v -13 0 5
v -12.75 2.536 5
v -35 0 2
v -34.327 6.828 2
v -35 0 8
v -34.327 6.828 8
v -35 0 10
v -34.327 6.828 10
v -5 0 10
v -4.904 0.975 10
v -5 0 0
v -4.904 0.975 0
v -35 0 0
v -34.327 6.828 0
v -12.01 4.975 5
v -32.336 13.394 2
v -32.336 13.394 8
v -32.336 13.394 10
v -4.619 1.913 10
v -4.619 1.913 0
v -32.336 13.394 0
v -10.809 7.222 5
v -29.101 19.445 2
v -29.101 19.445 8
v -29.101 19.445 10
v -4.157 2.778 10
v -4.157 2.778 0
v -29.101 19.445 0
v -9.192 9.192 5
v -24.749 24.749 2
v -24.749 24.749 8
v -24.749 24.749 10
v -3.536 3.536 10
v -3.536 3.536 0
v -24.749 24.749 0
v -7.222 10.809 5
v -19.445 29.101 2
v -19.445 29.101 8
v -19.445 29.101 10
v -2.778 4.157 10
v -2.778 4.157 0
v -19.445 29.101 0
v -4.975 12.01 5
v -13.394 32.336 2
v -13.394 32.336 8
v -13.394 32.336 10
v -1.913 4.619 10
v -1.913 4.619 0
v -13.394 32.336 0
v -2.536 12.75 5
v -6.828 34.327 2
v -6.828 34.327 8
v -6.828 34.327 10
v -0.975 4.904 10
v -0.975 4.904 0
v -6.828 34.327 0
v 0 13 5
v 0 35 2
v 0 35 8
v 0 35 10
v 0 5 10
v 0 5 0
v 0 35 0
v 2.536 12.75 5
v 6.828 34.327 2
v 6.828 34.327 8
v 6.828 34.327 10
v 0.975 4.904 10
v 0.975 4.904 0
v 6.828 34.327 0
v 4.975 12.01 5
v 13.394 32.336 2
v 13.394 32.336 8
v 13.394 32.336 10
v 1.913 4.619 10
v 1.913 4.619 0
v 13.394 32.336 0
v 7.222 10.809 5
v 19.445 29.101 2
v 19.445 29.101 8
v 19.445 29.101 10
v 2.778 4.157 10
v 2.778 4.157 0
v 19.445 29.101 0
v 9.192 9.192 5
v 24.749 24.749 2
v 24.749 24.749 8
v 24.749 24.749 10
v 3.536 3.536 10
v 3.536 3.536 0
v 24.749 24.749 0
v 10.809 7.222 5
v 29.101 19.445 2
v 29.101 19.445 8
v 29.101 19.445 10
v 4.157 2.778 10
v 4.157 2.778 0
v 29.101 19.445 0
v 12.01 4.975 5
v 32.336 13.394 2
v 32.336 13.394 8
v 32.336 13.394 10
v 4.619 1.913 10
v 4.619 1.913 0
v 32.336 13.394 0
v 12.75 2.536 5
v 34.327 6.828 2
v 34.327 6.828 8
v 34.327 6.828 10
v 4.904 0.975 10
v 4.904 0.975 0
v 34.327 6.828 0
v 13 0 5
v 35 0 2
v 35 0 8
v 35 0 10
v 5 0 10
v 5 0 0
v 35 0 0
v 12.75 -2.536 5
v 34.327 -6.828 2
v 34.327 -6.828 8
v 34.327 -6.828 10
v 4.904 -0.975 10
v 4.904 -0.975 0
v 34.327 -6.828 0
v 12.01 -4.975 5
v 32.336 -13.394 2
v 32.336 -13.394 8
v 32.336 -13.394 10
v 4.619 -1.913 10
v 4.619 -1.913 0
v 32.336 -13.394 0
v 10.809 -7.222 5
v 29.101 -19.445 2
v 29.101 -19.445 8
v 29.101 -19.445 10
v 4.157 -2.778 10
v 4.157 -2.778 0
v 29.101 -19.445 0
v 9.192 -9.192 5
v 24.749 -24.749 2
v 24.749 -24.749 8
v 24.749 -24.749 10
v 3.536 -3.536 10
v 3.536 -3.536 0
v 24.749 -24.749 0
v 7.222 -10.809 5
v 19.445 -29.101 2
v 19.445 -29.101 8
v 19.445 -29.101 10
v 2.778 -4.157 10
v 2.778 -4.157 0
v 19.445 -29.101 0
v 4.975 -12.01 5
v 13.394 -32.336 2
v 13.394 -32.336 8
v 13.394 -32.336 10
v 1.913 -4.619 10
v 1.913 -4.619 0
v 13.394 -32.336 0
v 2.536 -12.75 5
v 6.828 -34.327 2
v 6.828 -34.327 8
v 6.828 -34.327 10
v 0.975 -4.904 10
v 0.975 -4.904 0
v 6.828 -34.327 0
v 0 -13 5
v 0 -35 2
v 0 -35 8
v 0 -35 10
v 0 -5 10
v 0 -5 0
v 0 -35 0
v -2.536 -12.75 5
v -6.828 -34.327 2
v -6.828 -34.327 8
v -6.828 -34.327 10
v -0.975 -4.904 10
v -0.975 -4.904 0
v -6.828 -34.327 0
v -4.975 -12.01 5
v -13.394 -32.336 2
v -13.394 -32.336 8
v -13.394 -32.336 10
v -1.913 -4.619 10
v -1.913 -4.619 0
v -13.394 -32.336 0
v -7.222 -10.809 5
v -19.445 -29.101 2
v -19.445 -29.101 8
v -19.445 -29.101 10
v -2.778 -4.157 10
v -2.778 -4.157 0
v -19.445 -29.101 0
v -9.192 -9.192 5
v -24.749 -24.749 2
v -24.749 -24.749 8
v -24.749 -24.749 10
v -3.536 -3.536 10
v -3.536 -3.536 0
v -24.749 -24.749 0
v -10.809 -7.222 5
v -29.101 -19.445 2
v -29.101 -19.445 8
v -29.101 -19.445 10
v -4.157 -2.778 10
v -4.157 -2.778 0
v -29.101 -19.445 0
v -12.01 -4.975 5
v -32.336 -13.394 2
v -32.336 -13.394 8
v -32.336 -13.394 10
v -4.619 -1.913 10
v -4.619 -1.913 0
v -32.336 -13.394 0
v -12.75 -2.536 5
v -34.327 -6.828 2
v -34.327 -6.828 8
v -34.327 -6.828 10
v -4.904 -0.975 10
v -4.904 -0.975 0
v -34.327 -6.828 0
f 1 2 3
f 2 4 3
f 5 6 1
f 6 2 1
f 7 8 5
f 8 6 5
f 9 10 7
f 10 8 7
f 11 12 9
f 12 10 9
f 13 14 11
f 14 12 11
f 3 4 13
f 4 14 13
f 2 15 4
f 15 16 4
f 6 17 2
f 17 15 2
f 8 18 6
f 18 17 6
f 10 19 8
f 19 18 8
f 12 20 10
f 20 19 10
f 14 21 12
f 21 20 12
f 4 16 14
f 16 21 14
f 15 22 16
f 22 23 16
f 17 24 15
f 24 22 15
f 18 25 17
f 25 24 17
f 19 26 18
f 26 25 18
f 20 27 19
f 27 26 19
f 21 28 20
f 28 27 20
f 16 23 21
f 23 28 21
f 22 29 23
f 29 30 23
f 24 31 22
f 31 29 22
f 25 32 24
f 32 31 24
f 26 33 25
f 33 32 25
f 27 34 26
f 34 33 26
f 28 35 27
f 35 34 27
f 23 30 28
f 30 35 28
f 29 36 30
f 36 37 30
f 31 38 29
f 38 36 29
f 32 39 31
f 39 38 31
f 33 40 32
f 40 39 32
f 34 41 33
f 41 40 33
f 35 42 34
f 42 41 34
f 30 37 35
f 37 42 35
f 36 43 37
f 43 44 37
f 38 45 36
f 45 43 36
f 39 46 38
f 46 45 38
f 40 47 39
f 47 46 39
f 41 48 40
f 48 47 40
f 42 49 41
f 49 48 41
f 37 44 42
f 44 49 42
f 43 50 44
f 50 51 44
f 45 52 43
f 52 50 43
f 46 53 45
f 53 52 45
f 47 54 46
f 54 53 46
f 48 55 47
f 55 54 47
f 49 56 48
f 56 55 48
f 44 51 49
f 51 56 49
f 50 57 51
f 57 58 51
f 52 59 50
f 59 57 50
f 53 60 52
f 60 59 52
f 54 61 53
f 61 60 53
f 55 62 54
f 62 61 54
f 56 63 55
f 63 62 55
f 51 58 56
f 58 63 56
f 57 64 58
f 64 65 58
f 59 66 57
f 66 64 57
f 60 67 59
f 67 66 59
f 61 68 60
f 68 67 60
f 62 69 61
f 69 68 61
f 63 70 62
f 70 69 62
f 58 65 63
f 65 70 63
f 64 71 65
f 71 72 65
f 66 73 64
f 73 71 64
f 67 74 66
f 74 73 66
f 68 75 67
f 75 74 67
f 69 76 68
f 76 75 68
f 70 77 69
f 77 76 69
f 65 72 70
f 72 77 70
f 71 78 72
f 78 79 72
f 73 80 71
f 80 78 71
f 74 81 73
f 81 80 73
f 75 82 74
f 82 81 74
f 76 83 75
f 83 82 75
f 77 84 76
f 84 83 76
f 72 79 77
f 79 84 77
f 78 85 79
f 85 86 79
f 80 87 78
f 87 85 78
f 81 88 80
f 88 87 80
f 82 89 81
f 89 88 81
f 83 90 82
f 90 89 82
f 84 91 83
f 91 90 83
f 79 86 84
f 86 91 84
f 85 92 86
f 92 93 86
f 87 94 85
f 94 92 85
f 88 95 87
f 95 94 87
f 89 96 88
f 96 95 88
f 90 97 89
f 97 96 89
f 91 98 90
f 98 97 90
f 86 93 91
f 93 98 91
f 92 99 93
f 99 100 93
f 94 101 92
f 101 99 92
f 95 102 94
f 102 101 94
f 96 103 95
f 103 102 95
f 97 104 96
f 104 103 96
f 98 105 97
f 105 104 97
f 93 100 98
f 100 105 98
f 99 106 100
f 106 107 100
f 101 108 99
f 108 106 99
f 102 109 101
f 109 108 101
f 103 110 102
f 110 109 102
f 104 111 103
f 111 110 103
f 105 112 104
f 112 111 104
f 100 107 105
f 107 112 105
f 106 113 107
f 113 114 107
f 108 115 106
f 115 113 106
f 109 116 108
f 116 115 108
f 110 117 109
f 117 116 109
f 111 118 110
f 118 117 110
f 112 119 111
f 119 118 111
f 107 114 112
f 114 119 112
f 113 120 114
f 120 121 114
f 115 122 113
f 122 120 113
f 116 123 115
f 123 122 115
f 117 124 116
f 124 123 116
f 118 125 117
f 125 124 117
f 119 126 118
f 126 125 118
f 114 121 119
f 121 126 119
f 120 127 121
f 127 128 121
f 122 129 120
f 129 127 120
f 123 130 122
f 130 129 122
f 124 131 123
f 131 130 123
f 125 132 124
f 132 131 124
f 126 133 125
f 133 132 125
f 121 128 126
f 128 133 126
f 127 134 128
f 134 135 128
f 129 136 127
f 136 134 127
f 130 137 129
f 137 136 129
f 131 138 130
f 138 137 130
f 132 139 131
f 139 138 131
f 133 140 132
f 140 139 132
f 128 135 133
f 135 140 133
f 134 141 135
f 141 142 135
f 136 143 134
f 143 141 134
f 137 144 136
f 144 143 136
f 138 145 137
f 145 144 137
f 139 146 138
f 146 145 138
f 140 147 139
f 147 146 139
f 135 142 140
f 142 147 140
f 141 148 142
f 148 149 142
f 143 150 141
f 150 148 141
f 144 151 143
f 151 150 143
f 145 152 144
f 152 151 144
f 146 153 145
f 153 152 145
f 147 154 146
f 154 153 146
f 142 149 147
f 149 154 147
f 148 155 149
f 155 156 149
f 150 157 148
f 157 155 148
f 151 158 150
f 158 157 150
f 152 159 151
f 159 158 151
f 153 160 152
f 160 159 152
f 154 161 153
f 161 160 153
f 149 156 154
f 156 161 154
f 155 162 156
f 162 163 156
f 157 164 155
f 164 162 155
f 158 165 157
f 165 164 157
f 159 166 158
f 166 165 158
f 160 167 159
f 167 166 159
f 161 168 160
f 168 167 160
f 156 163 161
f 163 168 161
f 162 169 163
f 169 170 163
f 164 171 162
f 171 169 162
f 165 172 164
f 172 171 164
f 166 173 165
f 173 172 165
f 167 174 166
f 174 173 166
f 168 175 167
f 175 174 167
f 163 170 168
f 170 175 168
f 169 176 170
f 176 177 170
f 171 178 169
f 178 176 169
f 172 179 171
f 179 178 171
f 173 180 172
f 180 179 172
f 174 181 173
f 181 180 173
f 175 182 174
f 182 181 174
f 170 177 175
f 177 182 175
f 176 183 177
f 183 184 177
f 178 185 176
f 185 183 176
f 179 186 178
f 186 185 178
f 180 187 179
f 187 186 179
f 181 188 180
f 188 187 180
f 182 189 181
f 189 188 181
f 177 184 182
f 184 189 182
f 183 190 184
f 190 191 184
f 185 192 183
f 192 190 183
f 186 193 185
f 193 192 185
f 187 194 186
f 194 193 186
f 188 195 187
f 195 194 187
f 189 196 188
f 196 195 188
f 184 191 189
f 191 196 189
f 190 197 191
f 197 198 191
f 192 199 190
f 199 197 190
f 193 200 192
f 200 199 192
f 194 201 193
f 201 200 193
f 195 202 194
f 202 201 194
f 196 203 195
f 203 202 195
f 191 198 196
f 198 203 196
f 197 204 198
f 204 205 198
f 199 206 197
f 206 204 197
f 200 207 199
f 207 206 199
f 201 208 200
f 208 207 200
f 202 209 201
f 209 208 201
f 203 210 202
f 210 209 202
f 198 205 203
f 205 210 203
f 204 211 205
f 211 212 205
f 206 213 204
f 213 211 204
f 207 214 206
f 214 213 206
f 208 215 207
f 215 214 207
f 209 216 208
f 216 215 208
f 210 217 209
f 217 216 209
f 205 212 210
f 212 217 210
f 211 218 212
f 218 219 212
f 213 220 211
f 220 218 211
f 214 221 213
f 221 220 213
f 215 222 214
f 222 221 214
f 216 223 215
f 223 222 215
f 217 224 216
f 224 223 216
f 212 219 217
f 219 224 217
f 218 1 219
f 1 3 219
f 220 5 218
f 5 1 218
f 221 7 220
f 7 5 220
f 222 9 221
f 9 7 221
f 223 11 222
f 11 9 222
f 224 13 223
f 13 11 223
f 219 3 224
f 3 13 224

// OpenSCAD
$fn = 32;

// ----------------------------------------------------------------------
// Revolved part: V-groove pulley R35
// ----------------------------------------------------------------------

// --- parameters (mm) ---
bore_r = 5;               // bore radius
rim_r = 35;               // rim radius
rim_t = 10;               // rim width
groove_r = 13;            // groove root radius
groove_w = 3;             // groove half width
revolve_angle = 360;      // revolve sweep, degrees

bore_d = 2 * bore_r;
rim_d = 2 * rim_r;
groove_d = 2 * groove_r;

profile = [[5, 0], [35, 0], [35, 2], [13, 5], [35, 8], [35, 10], [5, 10]];  // primary outline, 7 points, counter clockwise

// --- the one profile operation ---
rotate_extrude(angle = revolve_angle) polygon(points = profile);
